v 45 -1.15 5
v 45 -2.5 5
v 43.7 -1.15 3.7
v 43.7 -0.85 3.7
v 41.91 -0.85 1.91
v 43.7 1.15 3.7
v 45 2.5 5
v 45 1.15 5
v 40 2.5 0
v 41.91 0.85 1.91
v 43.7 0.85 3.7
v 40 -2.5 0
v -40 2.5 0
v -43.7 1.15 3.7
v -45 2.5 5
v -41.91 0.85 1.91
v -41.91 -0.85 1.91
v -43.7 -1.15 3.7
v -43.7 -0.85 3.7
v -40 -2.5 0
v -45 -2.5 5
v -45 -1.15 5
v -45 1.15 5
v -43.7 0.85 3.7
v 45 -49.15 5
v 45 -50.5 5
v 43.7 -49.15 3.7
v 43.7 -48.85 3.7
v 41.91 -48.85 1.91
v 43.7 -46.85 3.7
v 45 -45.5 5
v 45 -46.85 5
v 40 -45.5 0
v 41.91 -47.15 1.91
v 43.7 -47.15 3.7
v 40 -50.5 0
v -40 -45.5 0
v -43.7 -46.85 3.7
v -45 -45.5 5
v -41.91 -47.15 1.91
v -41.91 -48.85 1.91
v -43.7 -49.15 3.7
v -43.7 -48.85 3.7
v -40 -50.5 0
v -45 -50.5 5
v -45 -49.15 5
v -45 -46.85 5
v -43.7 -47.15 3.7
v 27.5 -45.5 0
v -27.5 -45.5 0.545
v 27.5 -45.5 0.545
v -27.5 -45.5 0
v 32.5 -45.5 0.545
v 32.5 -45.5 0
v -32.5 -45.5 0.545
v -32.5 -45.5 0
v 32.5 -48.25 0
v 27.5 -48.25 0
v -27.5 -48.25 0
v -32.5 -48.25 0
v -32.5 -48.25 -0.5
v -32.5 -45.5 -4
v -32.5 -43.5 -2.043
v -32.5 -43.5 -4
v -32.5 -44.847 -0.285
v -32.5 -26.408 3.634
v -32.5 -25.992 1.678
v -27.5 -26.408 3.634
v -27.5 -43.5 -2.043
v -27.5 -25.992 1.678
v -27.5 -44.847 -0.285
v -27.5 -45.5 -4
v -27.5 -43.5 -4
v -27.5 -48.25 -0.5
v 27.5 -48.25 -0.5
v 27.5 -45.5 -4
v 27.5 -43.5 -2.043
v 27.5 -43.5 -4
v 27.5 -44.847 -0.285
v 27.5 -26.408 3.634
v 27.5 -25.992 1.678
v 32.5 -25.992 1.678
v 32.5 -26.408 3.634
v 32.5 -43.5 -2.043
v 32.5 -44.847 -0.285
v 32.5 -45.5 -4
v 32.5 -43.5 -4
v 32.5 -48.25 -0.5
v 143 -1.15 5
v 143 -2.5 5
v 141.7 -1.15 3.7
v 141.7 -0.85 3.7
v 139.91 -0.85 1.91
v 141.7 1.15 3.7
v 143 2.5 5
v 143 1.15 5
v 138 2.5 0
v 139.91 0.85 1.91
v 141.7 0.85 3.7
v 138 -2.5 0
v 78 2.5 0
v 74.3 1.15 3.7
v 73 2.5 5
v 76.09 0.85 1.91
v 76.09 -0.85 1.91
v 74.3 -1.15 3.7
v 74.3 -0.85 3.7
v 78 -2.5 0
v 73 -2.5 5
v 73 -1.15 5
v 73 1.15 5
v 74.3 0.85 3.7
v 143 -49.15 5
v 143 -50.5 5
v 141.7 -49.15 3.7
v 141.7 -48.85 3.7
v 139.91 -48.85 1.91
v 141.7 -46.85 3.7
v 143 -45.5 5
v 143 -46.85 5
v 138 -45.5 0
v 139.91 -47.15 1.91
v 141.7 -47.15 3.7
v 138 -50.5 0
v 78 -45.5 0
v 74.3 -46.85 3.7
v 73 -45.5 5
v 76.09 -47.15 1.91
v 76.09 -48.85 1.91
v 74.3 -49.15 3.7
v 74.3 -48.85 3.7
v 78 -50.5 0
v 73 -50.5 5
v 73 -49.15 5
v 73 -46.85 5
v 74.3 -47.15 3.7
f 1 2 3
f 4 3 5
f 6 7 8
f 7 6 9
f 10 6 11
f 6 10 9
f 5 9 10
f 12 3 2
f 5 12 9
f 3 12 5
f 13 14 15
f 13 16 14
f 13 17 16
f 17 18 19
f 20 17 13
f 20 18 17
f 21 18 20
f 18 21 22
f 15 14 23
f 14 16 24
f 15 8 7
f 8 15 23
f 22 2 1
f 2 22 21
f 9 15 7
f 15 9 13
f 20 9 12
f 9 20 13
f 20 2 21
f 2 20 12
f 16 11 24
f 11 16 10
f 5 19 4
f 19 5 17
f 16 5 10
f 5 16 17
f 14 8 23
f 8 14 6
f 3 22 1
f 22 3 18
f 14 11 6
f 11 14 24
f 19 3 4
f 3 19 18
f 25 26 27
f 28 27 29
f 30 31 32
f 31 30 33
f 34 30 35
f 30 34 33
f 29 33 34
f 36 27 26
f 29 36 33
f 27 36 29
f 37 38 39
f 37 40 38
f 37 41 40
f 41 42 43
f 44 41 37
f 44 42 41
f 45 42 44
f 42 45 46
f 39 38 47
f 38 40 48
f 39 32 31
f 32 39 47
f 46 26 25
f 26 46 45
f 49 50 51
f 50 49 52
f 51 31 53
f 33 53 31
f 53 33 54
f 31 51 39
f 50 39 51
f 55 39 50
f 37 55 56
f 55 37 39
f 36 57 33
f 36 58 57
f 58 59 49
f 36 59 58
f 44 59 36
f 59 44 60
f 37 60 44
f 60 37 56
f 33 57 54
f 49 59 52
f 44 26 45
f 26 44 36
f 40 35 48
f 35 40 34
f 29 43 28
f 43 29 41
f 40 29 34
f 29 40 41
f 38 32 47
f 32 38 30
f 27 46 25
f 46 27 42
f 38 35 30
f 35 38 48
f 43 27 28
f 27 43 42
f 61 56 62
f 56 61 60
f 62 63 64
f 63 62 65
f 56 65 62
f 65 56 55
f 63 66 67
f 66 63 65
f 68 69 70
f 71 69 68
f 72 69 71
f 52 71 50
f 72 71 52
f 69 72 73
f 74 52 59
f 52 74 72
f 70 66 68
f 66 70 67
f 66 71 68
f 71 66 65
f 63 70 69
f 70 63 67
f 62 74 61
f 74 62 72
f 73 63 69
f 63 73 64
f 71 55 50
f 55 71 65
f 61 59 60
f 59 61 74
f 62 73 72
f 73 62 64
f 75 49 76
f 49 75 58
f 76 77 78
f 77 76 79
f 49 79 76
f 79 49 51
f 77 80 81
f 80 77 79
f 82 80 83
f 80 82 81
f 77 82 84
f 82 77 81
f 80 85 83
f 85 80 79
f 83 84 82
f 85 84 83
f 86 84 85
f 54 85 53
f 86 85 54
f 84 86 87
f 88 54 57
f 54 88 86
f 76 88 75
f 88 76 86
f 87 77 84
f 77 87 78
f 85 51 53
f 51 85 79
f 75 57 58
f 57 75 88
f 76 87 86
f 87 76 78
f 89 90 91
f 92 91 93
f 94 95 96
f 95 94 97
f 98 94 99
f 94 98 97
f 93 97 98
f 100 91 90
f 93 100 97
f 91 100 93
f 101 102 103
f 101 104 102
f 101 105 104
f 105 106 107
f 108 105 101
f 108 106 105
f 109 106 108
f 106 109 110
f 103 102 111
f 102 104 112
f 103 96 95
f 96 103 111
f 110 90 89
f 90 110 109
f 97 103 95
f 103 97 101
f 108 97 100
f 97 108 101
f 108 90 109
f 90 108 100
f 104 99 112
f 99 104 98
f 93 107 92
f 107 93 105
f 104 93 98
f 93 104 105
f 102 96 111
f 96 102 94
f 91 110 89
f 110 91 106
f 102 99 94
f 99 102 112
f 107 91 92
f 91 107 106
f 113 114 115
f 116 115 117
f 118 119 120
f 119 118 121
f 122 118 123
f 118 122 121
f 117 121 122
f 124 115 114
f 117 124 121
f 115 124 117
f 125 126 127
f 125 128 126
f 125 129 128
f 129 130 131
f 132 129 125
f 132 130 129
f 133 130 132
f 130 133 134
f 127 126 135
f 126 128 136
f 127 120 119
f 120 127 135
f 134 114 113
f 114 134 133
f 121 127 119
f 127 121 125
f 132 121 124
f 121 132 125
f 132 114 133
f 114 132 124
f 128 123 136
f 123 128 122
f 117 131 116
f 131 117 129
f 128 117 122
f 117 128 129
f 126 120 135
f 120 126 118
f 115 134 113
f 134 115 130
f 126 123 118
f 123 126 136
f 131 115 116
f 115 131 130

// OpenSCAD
// ============================================================
// PCB Picture-Frame Rails (4 separate objects in one STL)
// - Inside-referenced 45° miters
// - PCB channel captures thickness in Z, opens inward
// - Bottom rail has angled legs (outside channel)
// - Channel faces UP for FDM printing
//
// PCB: 90 x 70 x 1.5 mm
// Units: mm
// ============================================================

// ---------------- PCB ----------------
pcb_x = 90;
pcb_y = 70;
pcb_t = 1.5;

// ---------------- Rail cross-section ----------------
rail_w = 5.0;   // border width (Y)
rail_z = 5.0;   // thickness (Z)

// ---------------- Channel ----------------
slot_clear = 0.10;
slot_z     = pcb_t + 2*slot_clear;
slot_depth = 3.0;

// ---------------- Legs (bottom rail only) ----------------
legs_enable   = true;
leg_w         = 5.0;
leg_th        = 2.0;
leg_len       = 20.0;
leg_inset     = 15.0;
leg_angle_deg = 12;
leg_y_out     = 3.0;
leg_y_span    = 2.0;

// ---------------- Derived ----------------
Lx = pcb_x;
Ly = pcb_y;

// ---------------- Rail geometry ----------------
module rail_outline_2d(L){
  polygon(points=[
    [-L/2,        0],
    [ L/2,        0],
    [ L/2-rail_w, rail_w],
    [-L/2+rail_w, rail_w]
  ]);
}

module rail_solid(L){
  linear_extrude(height=rail_z, center=true)
    rail_outline_2d(L);
}

module rail_with_channel(L){
  difference(){
    rail_solid(L);

    // PCB channel
    translate([0, slot_depth/2 - 0.01, 0])
      cube([L+2, slot_depth+0.2, slot_z], center=true);

    // flared mouth
    translate([0, 0.6, 0])
      cube([L+2, 1.4, slot_z+0.6], center=true);
  }
}

// ---------------- Angled leg ----------------
module angled_leg(xpos){
  y0 = rail_w + leg_y_out;

  translate([xpos, y0, 0])
    rotate([leg_angle_deg,0,0])
      translate([0, -leg_y_span/2, rail_z/2 + leg_len/2])
        cube([leg_w, leg_y_span, leg_len], center=true);

  hull(){
    translate([xpos, rail_w*0.9, rail_z*0.15])
      cube([leg_w, leg_th, leg_th], center=true);
    translate([xpos, y0, rail_z/2 + leg_th/2])
      cube([leg_w, leg_th, leg_th], center=true);
  }
}

module rail_part(L, is_bottom=false){
  rail_with_channel(L);

  if (is_bottom && legs_enable){
    for (sx=[-1,1])
      angled_leg(sx*(L/2 - leg_inset));
  }
}

// ---------------- Rails ----------------
module top_rail()    { rail_part(Lx, false); }
module bottom_rail() { rail_part(Lx, true ); }
module left_rail()   { rail_part(Ly, false); }
module right_rail()  { rail_part(Ly, false); }

// ============================================================
// PRINT ORIENTATION: channel faces UP (+Z)
// ============================================================
module top_print(){
  translate([0,0,rail_w]) rotate([-90,0,0]) top_rail();
}
module bottom_print(){
  translate([0,0,rail_w]) rotate([-90,0,0]) bottom_rail();
}
module left_print(){
  translate([0,0,rail_w]) rotate([-90,0,0]) left_rail();
}
module right_print(){
  translate([0,0,rail_w]) rotate([-90,0,0]) right_rail();
}

// ============================================================
// PRINT PLATE — 4 SEPARATE OBJECTS
// ============================================================
module print_plate_channel_up(){
  gap = 18;
  xshift = max(Lx, Ly) + gap;
  yshift = rail_z + gap + 25; // room for legs

  top_print();
  translate([0, -yshift, 0]) bottom_print();

  translate([xshift, 0, 0]) left_print();
  translate([xshift, -yshift, 0]) right_print();
}

// ---------------- OUTPUT ----------------
print_plate_channel_up();
